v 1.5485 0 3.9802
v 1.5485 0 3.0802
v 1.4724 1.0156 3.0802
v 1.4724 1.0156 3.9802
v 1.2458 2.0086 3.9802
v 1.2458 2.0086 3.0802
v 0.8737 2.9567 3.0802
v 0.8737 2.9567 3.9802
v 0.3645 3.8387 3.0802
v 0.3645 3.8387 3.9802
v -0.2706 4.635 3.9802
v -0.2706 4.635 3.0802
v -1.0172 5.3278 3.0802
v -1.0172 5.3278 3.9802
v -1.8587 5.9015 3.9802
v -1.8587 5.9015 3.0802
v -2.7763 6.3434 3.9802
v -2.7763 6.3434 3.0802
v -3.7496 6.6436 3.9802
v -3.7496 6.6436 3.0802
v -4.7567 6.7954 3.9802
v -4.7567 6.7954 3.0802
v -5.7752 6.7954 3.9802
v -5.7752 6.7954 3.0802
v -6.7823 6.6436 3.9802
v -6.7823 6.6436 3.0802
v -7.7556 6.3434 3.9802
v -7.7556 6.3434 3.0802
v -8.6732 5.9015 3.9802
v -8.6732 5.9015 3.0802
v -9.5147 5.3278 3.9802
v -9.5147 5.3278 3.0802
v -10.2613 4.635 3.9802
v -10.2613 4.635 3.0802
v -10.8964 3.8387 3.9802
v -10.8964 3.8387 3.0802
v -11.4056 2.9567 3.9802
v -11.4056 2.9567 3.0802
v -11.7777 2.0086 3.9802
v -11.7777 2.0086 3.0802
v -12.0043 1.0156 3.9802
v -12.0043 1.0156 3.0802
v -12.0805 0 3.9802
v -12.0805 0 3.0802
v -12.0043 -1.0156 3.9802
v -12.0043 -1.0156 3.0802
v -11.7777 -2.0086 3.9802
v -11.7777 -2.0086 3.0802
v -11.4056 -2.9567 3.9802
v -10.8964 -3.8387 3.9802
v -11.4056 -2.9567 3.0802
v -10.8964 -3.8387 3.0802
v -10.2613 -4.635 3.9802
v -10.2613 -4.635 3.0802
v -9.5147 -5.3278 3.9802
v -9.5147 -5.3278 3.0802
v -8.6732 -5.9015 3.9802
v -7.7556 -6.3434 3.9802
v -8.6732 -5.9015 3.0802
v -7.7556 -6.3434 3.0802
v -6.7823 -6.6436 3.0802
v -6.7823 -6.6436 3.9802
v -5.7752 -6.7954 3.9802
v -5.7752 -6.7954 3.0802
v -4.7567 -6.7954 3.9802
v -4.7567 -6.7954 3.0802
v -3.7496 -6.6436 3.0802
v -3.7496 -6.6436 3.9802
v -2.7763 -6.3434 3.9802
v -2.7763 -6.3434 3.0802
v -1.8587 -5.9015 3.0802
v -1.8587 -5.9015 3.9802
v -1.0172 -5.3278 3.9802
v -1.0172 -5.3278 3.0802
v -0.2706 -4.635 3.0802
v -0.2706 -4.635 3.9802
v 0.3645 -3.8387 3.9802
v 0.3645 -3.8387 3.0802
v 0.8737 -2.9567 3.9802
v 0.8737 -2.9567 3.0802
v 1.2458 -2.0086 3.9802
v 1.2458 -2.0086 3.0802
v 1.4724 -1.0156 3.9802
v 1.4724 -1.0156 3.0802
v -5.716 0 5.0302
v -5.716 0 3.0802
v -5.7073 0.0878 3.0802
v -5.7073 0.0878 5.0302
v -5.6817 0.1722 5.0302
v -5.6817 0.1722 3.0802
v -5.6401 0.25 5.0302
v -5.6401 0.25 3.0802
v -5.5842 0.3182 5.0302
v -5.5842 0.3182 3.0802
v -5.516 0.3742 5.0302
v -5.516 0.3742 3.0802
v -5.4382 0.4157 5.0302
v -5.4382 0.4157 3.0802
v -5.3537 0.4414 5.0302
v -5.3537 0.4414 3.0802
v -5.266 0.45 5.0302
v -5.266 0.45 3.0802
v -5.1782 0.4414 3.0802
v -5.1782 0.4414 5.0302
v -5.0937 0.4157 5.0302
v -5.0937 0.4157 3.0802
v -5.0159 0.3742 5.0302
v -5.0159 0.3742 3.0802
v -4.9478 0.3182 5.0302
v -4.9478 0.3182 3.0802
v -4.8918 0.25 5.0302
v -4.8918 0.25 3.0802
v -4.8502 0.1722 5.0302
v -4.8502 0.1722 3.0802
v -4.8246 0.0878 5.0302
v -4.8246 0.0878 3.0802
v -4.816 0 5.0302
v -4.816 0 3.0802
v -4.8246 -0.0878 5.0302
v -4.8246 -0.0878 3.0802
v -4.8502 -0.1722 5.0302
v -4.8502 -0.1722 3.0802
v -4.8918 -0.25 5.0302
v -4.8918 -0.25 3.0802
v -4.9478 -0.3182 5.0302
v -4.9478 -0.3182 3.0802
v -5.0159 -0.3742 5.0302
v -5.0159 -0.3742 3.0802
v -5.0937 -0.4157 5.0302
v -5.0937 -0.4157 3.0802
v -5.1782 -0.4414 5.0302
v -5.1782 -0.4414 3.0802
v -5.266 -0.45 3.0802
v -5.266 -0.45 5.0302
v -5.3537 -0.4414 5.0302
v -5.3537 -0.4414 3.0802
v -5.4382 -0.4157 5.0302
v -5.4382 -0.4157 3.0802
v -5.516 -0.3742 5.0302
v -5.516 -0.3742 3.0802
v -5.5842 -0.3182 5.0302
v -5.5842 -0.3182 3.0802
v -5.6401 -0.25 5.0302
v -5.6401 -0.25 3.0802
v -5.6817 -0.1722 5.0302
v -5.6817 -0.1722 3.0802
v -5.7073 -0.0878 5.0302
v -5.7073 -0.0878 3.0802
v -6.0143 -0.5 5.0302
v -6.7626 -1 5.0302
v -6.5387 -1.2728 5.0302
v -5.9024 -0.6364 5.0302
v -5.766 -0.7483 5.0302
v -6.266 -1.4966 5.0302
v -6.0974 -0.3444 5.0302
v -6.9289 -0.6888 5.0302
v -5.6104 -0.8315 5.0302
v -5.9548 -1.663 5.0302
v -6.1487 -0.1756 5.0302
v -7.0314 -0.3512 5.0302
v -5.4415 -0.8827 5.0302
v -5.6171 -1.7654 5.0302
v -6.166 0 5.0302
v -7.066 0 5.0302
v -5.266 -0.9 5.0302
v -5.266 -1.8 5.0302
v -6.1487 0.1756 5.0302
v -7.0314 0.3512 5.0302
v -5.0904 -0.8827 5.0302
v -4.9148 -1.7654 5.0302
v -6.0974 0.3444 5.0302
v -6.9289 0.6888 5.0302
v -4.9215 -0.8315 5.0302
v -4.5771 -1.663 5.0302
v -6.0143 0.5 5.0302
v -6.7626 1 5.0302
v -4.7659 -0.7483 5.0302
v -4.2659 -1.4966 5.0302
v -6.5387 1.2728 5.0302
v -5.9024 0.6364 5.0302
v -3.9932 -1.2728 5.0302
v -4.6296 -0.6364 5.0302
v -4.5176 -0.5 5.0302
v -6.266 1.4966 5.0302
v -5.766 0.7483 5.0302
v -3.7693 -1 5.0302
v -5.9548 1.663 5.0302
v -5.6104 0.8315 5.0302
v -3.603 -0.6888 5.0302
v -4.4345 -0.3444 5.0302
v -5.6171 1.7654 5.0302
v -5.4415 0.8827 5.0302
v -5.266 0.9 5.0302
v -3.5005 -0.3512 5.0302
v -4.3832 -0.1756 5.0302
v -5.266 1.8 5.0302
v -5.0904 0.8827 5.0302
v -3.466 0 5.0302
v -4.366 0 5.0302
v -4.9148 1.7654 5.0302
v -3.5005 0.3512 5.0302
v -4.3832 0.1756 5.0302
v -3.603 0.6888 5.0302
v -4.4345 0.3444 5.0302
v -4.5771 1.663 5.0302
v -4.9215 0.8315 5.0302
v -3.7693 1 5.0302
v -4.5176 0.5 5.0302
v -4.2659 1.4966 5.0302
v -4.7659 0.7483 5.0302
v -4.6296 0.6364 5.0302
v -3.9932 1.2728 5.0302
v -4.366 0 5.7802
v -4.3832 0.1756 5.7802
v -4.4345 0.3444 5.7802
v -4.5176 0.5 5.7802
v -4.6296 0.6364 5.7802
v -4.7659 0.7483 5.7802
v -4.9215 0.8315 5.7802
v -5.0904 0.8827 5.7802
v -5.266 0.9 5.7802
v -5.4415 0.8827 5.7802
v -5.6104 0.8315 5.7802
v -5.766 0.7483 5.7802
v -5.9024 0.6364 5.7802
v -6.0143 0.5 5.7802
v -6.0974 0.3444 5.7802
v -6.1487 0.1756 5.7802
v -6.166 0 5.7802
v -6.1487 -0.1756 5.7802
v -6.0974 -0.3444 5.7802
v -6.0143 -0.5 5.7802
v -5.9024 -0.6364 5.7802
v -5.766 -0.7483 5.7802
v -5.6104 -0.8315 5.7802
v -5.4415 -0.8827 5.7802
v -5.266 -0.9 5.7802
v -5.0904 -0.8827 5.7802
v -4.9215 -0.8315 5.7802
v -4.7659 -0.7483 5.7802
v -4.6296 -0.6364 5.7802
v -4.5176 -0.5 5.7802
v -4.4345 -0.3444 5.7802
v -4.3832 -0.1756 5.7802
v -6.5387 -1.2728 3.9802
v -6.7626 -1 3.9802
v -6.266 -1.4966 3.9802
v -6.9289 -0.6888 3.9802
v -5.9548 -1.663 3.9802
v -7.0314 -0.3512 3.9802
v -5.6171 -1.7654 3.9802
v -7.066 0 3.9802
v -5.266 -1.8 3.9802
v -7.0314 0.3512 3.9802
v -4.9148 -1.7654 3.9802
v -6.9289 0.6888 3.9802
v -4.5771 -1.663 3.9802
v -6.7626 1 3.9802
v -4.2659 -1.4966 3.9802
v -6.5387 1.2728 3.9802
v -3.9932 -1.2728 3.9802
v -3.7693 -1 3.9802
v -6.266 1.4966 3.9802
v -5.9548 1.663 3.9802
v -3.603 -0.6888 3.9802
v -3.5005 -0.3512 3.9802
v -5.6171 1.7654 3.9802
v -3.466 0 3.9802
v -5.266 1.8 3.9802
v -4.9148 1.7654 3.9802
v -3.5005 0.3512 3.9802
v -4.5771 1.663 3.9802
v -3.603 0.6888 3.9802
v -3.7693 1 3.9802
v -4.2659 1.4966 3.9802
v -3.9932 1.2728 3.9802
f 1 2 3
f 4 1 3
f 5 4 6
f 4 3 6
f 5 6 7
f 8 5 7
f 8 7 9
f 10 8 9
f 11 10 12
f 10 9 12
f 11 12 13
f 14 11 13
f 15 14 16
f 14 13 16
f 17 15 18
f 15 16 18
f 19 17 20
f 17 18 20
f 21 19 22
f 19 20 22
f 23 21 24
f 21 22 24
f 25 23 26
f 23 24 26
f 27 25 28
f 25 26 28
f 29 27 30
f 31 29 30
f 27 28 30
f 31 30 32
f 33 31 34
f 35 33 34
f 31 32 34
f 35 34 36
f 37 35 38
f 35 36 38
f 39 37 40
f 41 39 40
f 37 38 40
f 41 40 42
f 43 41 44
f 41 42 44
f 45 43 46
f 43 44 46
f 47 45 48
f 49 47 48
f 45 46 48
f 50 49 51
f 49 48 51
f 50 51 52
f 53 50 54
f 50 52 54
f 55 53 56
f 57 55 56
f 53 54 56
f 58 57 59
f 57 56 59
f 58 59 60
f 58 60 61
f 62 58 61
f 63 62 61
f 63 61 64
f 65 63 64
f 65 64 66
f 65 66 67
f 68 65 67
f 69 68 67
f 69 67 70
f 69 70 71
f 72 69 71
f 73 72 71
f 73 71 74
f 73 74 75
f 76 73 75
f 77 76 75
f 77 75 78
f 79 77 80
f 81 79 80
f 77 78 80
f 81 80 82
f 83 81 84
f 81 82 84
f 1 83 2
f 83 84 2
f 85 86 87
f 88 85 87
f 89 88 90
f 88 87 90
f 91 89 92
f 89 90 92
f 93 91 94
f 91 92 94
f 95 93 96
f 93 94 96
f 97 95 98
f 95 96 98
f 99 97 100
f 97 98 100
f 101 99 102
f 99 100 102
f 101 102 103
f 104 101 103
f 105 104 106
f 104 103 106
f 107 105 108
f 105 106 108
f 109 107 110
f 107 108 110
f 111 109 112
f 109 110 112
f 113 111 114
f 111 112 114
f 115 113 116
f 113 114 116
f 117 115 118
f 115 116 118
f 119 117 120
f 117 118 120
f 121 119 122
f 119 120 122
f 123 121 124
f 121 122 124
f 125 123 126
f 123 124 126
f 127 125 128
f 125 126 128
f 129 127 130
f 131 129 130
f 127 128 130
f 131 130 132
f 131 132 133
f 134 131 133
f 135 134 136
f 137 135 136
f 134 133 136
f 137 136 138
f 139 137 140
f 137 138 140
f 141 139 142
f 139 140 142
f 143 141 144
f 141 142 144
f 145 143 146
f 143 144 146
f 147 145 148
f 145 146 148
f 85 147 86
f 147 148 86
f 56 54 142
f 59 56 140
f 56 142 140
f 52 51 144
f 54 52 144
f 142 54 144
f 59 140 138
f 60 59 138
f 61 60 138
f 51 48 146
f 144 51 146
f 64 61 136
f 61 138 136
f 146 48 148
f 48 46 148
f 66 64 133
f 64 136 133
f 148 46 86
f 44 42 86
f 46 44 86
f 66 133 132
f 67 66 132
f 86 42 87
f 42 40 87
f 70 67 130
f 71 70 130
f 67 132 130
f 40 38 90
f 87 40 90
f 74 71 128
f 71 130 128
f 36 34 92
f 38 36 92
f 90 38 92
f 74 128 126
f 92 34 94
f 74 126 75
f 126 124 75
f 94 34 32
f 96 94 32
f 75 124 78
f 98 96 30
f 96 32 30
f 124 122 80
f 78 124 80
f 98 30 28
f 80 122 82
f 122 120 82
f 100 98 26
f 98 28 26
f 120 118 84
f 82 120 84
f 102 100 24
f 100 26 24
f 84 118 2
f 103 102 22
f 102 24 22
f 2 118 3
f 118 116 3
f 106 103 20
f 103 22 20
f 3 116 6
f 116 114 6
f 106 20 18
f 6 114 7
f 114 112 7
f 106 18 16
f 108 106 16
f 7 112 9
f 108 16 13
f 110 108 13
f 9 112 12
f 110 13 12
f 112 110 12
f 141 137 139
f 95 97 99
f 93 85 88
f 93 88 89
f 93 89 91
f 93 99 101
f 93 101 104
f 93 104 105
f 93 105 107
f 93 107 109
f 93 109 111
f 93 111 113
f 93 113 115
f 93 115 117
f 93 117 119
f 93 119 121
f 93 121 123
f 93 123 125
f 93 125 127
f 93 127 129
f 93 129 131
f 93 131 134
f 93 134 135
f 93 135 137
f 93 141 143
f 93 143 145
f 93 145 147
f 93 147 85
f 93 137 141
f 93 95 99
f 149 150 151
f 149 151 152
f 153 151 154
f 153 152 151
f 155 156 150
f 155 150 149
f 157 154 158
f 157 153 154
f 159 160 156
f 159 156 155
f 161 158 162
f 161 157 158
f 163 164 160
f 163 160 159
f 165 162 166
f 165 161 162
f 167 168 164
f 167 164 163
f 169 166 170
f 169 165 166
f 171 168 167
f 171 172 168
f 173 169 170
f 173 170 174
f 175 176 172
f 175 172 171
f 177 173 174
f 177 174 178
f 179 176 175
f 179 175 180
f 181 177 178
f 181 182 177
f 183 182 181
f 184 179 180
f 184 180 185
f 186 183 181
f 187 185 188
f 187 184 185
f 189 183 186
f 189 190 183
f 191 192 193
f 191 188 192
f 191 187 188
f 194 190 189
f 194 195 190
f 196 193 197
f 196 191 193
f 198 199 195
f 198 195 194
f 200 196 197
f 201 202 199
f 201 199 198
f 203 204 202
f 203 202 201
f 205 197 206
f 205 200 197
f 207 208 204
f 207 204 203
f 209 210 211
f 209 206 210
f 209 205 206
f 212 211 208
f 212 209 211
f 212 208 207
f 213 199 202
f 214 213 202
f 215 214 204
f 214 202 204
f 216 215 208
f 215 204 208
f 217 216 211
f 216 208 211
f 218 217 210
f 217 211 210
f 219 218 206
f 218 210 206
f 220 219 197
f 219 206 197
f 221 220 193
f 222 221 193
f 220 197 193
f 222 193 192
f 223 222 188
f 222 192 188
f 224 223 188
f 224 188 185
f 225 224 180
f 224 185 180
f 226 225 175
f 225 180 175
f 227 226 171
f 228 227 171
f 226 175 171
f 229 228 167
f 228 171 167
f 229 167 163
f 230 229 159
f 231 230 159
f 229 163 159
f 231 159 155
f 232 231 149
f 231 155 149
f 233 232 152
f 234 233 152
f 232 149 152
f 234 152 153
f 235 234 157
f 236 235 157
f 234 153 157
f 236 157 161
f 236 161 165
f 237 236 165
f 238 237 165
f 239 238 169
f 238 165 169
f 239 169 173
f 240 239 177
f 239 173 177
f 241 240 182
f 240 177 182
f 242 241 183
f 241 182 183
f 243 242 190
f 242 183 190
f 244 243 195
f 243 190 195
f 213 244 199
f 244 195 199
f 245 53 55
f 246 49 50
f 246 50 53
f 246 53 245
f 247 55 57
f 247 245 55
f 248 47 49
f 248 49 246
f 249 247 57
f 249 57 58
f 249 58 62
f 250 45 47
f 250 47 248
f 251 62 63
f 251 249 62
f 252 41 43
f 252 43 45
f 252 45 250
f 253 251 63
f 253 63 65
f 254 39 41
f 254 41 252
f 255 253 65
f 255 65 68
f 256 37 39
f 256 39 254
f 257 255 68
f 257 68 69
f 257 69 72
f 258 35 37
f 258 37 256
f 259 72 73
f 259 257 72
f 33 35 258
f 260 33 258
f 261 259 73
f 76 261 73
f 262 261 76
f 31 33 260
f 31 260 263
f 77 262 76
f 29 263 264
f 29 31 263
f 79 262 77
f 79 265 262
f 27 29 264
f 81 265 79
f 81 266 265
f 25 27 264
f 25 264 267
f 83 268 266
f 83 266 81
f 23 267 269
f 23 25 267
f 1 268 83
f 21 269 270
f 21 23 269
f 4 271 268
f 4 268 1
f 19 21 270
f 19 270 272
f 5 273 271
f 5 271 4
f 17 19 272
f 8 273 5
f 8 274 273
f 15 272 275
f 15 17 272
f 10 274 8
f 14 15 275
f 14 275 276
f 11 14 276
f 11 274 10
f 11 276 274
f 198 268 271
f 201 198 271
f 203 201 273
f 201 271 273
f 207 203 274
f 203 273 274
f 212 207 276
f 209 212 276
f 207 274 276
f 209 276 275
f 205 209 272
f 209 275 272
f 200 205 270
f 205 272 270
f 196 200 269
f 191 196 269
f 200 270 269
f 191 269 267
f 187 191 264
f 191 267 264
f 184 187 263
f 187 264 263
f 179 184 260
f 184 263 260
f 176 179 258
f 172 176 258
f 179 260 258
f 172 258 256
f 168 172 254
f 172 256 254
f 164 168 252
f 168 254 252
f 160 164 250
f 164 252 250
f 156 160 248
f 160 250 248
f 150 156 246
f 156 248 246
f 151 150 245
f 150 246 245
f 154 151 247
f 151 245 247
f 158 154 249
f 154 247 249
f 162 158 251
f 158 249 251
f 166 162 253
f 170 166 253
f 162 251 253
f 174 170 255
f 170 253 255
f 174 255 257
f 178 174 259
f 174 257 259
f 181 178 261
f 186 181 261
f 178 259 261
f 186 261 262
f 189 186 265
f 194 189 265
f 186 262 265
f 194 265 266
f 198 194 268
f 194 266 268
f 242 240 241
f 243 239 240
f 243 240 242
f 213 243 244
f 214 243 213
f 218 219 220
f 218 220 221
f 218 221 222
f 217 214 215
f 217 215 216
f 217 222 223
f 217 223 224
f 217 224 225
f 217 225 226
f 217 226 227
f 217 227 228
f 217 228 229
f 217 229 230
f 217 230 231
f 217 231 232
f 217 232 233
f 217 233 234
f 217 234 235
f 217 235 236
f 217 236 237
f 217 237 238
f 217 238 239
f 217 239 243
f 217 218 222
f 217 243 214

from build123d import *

# Parameters (mm, degrees)
SKETCH2_R           = 45.43
BOSS_EXTRUDE2_DEPTH = 6
SKETCH3_R           = 12
BOSS_EXTRUDE3_DEPTH = 7
SKETCH4_R           = 6
BOSS_EXTRUDE4_DEPTH = 5
SKETCH5_R           = 3
CUT_EXTRUDE1_DEPTH  = 13
SCALE1_SCALE        = 0.15


with BuildPart() as part:
    # Sketch2 → Boss-Extrude2 (new body)
    with BuildSketch(Plane.XY):
        with Locations((-5.265954001, 0)):
            Circle(SKETCH2_R)
    extrude(amount=BOSS_EXTRUDE2_DEPTH)

    # Sketch3 → Boss-Extrude3 (add)
    with BuildSketch(Plane.XY.offset(6)):
        with Locations((-5.265954001, 0)):
            Circle(SKETCH3_R)
    extrude(amount=BOSS_EXTRUDE3_DEPTH)

    # Sketch4 → Boss-Extrude4 (add)
    with BuildSketch(Plane.XY.offset(13)):
        with Locations((-5.265954001, 0)):
            Circle(SKETCH4_R)
    extrude(amount=BOSS_EXTRUDE4_DEPTH)

    # Sketch5 → Cut-Extrude1 (cut)
    with BuildSketch(Plane(origin=(0, 0, 0), x_dir=(-1, 0, 0), z_dir=(0, 0, -1))):
        with Locations((5.265954001, 0)):
            Circle(SKETCH5_R)
    extrude(amount=-CUT_EXTRUDE1_DEPTH, mode=Mode.SUBTRACT)


with BuildPart() as part_1:
    # Scale1: scaled about (-5.265954001, 0, 3.623777836)
    add(part.part.scale(SCALE1_SCALE).moved(Location((-4.476060901, 0, 3.080211161))))


solid = part_1.part
